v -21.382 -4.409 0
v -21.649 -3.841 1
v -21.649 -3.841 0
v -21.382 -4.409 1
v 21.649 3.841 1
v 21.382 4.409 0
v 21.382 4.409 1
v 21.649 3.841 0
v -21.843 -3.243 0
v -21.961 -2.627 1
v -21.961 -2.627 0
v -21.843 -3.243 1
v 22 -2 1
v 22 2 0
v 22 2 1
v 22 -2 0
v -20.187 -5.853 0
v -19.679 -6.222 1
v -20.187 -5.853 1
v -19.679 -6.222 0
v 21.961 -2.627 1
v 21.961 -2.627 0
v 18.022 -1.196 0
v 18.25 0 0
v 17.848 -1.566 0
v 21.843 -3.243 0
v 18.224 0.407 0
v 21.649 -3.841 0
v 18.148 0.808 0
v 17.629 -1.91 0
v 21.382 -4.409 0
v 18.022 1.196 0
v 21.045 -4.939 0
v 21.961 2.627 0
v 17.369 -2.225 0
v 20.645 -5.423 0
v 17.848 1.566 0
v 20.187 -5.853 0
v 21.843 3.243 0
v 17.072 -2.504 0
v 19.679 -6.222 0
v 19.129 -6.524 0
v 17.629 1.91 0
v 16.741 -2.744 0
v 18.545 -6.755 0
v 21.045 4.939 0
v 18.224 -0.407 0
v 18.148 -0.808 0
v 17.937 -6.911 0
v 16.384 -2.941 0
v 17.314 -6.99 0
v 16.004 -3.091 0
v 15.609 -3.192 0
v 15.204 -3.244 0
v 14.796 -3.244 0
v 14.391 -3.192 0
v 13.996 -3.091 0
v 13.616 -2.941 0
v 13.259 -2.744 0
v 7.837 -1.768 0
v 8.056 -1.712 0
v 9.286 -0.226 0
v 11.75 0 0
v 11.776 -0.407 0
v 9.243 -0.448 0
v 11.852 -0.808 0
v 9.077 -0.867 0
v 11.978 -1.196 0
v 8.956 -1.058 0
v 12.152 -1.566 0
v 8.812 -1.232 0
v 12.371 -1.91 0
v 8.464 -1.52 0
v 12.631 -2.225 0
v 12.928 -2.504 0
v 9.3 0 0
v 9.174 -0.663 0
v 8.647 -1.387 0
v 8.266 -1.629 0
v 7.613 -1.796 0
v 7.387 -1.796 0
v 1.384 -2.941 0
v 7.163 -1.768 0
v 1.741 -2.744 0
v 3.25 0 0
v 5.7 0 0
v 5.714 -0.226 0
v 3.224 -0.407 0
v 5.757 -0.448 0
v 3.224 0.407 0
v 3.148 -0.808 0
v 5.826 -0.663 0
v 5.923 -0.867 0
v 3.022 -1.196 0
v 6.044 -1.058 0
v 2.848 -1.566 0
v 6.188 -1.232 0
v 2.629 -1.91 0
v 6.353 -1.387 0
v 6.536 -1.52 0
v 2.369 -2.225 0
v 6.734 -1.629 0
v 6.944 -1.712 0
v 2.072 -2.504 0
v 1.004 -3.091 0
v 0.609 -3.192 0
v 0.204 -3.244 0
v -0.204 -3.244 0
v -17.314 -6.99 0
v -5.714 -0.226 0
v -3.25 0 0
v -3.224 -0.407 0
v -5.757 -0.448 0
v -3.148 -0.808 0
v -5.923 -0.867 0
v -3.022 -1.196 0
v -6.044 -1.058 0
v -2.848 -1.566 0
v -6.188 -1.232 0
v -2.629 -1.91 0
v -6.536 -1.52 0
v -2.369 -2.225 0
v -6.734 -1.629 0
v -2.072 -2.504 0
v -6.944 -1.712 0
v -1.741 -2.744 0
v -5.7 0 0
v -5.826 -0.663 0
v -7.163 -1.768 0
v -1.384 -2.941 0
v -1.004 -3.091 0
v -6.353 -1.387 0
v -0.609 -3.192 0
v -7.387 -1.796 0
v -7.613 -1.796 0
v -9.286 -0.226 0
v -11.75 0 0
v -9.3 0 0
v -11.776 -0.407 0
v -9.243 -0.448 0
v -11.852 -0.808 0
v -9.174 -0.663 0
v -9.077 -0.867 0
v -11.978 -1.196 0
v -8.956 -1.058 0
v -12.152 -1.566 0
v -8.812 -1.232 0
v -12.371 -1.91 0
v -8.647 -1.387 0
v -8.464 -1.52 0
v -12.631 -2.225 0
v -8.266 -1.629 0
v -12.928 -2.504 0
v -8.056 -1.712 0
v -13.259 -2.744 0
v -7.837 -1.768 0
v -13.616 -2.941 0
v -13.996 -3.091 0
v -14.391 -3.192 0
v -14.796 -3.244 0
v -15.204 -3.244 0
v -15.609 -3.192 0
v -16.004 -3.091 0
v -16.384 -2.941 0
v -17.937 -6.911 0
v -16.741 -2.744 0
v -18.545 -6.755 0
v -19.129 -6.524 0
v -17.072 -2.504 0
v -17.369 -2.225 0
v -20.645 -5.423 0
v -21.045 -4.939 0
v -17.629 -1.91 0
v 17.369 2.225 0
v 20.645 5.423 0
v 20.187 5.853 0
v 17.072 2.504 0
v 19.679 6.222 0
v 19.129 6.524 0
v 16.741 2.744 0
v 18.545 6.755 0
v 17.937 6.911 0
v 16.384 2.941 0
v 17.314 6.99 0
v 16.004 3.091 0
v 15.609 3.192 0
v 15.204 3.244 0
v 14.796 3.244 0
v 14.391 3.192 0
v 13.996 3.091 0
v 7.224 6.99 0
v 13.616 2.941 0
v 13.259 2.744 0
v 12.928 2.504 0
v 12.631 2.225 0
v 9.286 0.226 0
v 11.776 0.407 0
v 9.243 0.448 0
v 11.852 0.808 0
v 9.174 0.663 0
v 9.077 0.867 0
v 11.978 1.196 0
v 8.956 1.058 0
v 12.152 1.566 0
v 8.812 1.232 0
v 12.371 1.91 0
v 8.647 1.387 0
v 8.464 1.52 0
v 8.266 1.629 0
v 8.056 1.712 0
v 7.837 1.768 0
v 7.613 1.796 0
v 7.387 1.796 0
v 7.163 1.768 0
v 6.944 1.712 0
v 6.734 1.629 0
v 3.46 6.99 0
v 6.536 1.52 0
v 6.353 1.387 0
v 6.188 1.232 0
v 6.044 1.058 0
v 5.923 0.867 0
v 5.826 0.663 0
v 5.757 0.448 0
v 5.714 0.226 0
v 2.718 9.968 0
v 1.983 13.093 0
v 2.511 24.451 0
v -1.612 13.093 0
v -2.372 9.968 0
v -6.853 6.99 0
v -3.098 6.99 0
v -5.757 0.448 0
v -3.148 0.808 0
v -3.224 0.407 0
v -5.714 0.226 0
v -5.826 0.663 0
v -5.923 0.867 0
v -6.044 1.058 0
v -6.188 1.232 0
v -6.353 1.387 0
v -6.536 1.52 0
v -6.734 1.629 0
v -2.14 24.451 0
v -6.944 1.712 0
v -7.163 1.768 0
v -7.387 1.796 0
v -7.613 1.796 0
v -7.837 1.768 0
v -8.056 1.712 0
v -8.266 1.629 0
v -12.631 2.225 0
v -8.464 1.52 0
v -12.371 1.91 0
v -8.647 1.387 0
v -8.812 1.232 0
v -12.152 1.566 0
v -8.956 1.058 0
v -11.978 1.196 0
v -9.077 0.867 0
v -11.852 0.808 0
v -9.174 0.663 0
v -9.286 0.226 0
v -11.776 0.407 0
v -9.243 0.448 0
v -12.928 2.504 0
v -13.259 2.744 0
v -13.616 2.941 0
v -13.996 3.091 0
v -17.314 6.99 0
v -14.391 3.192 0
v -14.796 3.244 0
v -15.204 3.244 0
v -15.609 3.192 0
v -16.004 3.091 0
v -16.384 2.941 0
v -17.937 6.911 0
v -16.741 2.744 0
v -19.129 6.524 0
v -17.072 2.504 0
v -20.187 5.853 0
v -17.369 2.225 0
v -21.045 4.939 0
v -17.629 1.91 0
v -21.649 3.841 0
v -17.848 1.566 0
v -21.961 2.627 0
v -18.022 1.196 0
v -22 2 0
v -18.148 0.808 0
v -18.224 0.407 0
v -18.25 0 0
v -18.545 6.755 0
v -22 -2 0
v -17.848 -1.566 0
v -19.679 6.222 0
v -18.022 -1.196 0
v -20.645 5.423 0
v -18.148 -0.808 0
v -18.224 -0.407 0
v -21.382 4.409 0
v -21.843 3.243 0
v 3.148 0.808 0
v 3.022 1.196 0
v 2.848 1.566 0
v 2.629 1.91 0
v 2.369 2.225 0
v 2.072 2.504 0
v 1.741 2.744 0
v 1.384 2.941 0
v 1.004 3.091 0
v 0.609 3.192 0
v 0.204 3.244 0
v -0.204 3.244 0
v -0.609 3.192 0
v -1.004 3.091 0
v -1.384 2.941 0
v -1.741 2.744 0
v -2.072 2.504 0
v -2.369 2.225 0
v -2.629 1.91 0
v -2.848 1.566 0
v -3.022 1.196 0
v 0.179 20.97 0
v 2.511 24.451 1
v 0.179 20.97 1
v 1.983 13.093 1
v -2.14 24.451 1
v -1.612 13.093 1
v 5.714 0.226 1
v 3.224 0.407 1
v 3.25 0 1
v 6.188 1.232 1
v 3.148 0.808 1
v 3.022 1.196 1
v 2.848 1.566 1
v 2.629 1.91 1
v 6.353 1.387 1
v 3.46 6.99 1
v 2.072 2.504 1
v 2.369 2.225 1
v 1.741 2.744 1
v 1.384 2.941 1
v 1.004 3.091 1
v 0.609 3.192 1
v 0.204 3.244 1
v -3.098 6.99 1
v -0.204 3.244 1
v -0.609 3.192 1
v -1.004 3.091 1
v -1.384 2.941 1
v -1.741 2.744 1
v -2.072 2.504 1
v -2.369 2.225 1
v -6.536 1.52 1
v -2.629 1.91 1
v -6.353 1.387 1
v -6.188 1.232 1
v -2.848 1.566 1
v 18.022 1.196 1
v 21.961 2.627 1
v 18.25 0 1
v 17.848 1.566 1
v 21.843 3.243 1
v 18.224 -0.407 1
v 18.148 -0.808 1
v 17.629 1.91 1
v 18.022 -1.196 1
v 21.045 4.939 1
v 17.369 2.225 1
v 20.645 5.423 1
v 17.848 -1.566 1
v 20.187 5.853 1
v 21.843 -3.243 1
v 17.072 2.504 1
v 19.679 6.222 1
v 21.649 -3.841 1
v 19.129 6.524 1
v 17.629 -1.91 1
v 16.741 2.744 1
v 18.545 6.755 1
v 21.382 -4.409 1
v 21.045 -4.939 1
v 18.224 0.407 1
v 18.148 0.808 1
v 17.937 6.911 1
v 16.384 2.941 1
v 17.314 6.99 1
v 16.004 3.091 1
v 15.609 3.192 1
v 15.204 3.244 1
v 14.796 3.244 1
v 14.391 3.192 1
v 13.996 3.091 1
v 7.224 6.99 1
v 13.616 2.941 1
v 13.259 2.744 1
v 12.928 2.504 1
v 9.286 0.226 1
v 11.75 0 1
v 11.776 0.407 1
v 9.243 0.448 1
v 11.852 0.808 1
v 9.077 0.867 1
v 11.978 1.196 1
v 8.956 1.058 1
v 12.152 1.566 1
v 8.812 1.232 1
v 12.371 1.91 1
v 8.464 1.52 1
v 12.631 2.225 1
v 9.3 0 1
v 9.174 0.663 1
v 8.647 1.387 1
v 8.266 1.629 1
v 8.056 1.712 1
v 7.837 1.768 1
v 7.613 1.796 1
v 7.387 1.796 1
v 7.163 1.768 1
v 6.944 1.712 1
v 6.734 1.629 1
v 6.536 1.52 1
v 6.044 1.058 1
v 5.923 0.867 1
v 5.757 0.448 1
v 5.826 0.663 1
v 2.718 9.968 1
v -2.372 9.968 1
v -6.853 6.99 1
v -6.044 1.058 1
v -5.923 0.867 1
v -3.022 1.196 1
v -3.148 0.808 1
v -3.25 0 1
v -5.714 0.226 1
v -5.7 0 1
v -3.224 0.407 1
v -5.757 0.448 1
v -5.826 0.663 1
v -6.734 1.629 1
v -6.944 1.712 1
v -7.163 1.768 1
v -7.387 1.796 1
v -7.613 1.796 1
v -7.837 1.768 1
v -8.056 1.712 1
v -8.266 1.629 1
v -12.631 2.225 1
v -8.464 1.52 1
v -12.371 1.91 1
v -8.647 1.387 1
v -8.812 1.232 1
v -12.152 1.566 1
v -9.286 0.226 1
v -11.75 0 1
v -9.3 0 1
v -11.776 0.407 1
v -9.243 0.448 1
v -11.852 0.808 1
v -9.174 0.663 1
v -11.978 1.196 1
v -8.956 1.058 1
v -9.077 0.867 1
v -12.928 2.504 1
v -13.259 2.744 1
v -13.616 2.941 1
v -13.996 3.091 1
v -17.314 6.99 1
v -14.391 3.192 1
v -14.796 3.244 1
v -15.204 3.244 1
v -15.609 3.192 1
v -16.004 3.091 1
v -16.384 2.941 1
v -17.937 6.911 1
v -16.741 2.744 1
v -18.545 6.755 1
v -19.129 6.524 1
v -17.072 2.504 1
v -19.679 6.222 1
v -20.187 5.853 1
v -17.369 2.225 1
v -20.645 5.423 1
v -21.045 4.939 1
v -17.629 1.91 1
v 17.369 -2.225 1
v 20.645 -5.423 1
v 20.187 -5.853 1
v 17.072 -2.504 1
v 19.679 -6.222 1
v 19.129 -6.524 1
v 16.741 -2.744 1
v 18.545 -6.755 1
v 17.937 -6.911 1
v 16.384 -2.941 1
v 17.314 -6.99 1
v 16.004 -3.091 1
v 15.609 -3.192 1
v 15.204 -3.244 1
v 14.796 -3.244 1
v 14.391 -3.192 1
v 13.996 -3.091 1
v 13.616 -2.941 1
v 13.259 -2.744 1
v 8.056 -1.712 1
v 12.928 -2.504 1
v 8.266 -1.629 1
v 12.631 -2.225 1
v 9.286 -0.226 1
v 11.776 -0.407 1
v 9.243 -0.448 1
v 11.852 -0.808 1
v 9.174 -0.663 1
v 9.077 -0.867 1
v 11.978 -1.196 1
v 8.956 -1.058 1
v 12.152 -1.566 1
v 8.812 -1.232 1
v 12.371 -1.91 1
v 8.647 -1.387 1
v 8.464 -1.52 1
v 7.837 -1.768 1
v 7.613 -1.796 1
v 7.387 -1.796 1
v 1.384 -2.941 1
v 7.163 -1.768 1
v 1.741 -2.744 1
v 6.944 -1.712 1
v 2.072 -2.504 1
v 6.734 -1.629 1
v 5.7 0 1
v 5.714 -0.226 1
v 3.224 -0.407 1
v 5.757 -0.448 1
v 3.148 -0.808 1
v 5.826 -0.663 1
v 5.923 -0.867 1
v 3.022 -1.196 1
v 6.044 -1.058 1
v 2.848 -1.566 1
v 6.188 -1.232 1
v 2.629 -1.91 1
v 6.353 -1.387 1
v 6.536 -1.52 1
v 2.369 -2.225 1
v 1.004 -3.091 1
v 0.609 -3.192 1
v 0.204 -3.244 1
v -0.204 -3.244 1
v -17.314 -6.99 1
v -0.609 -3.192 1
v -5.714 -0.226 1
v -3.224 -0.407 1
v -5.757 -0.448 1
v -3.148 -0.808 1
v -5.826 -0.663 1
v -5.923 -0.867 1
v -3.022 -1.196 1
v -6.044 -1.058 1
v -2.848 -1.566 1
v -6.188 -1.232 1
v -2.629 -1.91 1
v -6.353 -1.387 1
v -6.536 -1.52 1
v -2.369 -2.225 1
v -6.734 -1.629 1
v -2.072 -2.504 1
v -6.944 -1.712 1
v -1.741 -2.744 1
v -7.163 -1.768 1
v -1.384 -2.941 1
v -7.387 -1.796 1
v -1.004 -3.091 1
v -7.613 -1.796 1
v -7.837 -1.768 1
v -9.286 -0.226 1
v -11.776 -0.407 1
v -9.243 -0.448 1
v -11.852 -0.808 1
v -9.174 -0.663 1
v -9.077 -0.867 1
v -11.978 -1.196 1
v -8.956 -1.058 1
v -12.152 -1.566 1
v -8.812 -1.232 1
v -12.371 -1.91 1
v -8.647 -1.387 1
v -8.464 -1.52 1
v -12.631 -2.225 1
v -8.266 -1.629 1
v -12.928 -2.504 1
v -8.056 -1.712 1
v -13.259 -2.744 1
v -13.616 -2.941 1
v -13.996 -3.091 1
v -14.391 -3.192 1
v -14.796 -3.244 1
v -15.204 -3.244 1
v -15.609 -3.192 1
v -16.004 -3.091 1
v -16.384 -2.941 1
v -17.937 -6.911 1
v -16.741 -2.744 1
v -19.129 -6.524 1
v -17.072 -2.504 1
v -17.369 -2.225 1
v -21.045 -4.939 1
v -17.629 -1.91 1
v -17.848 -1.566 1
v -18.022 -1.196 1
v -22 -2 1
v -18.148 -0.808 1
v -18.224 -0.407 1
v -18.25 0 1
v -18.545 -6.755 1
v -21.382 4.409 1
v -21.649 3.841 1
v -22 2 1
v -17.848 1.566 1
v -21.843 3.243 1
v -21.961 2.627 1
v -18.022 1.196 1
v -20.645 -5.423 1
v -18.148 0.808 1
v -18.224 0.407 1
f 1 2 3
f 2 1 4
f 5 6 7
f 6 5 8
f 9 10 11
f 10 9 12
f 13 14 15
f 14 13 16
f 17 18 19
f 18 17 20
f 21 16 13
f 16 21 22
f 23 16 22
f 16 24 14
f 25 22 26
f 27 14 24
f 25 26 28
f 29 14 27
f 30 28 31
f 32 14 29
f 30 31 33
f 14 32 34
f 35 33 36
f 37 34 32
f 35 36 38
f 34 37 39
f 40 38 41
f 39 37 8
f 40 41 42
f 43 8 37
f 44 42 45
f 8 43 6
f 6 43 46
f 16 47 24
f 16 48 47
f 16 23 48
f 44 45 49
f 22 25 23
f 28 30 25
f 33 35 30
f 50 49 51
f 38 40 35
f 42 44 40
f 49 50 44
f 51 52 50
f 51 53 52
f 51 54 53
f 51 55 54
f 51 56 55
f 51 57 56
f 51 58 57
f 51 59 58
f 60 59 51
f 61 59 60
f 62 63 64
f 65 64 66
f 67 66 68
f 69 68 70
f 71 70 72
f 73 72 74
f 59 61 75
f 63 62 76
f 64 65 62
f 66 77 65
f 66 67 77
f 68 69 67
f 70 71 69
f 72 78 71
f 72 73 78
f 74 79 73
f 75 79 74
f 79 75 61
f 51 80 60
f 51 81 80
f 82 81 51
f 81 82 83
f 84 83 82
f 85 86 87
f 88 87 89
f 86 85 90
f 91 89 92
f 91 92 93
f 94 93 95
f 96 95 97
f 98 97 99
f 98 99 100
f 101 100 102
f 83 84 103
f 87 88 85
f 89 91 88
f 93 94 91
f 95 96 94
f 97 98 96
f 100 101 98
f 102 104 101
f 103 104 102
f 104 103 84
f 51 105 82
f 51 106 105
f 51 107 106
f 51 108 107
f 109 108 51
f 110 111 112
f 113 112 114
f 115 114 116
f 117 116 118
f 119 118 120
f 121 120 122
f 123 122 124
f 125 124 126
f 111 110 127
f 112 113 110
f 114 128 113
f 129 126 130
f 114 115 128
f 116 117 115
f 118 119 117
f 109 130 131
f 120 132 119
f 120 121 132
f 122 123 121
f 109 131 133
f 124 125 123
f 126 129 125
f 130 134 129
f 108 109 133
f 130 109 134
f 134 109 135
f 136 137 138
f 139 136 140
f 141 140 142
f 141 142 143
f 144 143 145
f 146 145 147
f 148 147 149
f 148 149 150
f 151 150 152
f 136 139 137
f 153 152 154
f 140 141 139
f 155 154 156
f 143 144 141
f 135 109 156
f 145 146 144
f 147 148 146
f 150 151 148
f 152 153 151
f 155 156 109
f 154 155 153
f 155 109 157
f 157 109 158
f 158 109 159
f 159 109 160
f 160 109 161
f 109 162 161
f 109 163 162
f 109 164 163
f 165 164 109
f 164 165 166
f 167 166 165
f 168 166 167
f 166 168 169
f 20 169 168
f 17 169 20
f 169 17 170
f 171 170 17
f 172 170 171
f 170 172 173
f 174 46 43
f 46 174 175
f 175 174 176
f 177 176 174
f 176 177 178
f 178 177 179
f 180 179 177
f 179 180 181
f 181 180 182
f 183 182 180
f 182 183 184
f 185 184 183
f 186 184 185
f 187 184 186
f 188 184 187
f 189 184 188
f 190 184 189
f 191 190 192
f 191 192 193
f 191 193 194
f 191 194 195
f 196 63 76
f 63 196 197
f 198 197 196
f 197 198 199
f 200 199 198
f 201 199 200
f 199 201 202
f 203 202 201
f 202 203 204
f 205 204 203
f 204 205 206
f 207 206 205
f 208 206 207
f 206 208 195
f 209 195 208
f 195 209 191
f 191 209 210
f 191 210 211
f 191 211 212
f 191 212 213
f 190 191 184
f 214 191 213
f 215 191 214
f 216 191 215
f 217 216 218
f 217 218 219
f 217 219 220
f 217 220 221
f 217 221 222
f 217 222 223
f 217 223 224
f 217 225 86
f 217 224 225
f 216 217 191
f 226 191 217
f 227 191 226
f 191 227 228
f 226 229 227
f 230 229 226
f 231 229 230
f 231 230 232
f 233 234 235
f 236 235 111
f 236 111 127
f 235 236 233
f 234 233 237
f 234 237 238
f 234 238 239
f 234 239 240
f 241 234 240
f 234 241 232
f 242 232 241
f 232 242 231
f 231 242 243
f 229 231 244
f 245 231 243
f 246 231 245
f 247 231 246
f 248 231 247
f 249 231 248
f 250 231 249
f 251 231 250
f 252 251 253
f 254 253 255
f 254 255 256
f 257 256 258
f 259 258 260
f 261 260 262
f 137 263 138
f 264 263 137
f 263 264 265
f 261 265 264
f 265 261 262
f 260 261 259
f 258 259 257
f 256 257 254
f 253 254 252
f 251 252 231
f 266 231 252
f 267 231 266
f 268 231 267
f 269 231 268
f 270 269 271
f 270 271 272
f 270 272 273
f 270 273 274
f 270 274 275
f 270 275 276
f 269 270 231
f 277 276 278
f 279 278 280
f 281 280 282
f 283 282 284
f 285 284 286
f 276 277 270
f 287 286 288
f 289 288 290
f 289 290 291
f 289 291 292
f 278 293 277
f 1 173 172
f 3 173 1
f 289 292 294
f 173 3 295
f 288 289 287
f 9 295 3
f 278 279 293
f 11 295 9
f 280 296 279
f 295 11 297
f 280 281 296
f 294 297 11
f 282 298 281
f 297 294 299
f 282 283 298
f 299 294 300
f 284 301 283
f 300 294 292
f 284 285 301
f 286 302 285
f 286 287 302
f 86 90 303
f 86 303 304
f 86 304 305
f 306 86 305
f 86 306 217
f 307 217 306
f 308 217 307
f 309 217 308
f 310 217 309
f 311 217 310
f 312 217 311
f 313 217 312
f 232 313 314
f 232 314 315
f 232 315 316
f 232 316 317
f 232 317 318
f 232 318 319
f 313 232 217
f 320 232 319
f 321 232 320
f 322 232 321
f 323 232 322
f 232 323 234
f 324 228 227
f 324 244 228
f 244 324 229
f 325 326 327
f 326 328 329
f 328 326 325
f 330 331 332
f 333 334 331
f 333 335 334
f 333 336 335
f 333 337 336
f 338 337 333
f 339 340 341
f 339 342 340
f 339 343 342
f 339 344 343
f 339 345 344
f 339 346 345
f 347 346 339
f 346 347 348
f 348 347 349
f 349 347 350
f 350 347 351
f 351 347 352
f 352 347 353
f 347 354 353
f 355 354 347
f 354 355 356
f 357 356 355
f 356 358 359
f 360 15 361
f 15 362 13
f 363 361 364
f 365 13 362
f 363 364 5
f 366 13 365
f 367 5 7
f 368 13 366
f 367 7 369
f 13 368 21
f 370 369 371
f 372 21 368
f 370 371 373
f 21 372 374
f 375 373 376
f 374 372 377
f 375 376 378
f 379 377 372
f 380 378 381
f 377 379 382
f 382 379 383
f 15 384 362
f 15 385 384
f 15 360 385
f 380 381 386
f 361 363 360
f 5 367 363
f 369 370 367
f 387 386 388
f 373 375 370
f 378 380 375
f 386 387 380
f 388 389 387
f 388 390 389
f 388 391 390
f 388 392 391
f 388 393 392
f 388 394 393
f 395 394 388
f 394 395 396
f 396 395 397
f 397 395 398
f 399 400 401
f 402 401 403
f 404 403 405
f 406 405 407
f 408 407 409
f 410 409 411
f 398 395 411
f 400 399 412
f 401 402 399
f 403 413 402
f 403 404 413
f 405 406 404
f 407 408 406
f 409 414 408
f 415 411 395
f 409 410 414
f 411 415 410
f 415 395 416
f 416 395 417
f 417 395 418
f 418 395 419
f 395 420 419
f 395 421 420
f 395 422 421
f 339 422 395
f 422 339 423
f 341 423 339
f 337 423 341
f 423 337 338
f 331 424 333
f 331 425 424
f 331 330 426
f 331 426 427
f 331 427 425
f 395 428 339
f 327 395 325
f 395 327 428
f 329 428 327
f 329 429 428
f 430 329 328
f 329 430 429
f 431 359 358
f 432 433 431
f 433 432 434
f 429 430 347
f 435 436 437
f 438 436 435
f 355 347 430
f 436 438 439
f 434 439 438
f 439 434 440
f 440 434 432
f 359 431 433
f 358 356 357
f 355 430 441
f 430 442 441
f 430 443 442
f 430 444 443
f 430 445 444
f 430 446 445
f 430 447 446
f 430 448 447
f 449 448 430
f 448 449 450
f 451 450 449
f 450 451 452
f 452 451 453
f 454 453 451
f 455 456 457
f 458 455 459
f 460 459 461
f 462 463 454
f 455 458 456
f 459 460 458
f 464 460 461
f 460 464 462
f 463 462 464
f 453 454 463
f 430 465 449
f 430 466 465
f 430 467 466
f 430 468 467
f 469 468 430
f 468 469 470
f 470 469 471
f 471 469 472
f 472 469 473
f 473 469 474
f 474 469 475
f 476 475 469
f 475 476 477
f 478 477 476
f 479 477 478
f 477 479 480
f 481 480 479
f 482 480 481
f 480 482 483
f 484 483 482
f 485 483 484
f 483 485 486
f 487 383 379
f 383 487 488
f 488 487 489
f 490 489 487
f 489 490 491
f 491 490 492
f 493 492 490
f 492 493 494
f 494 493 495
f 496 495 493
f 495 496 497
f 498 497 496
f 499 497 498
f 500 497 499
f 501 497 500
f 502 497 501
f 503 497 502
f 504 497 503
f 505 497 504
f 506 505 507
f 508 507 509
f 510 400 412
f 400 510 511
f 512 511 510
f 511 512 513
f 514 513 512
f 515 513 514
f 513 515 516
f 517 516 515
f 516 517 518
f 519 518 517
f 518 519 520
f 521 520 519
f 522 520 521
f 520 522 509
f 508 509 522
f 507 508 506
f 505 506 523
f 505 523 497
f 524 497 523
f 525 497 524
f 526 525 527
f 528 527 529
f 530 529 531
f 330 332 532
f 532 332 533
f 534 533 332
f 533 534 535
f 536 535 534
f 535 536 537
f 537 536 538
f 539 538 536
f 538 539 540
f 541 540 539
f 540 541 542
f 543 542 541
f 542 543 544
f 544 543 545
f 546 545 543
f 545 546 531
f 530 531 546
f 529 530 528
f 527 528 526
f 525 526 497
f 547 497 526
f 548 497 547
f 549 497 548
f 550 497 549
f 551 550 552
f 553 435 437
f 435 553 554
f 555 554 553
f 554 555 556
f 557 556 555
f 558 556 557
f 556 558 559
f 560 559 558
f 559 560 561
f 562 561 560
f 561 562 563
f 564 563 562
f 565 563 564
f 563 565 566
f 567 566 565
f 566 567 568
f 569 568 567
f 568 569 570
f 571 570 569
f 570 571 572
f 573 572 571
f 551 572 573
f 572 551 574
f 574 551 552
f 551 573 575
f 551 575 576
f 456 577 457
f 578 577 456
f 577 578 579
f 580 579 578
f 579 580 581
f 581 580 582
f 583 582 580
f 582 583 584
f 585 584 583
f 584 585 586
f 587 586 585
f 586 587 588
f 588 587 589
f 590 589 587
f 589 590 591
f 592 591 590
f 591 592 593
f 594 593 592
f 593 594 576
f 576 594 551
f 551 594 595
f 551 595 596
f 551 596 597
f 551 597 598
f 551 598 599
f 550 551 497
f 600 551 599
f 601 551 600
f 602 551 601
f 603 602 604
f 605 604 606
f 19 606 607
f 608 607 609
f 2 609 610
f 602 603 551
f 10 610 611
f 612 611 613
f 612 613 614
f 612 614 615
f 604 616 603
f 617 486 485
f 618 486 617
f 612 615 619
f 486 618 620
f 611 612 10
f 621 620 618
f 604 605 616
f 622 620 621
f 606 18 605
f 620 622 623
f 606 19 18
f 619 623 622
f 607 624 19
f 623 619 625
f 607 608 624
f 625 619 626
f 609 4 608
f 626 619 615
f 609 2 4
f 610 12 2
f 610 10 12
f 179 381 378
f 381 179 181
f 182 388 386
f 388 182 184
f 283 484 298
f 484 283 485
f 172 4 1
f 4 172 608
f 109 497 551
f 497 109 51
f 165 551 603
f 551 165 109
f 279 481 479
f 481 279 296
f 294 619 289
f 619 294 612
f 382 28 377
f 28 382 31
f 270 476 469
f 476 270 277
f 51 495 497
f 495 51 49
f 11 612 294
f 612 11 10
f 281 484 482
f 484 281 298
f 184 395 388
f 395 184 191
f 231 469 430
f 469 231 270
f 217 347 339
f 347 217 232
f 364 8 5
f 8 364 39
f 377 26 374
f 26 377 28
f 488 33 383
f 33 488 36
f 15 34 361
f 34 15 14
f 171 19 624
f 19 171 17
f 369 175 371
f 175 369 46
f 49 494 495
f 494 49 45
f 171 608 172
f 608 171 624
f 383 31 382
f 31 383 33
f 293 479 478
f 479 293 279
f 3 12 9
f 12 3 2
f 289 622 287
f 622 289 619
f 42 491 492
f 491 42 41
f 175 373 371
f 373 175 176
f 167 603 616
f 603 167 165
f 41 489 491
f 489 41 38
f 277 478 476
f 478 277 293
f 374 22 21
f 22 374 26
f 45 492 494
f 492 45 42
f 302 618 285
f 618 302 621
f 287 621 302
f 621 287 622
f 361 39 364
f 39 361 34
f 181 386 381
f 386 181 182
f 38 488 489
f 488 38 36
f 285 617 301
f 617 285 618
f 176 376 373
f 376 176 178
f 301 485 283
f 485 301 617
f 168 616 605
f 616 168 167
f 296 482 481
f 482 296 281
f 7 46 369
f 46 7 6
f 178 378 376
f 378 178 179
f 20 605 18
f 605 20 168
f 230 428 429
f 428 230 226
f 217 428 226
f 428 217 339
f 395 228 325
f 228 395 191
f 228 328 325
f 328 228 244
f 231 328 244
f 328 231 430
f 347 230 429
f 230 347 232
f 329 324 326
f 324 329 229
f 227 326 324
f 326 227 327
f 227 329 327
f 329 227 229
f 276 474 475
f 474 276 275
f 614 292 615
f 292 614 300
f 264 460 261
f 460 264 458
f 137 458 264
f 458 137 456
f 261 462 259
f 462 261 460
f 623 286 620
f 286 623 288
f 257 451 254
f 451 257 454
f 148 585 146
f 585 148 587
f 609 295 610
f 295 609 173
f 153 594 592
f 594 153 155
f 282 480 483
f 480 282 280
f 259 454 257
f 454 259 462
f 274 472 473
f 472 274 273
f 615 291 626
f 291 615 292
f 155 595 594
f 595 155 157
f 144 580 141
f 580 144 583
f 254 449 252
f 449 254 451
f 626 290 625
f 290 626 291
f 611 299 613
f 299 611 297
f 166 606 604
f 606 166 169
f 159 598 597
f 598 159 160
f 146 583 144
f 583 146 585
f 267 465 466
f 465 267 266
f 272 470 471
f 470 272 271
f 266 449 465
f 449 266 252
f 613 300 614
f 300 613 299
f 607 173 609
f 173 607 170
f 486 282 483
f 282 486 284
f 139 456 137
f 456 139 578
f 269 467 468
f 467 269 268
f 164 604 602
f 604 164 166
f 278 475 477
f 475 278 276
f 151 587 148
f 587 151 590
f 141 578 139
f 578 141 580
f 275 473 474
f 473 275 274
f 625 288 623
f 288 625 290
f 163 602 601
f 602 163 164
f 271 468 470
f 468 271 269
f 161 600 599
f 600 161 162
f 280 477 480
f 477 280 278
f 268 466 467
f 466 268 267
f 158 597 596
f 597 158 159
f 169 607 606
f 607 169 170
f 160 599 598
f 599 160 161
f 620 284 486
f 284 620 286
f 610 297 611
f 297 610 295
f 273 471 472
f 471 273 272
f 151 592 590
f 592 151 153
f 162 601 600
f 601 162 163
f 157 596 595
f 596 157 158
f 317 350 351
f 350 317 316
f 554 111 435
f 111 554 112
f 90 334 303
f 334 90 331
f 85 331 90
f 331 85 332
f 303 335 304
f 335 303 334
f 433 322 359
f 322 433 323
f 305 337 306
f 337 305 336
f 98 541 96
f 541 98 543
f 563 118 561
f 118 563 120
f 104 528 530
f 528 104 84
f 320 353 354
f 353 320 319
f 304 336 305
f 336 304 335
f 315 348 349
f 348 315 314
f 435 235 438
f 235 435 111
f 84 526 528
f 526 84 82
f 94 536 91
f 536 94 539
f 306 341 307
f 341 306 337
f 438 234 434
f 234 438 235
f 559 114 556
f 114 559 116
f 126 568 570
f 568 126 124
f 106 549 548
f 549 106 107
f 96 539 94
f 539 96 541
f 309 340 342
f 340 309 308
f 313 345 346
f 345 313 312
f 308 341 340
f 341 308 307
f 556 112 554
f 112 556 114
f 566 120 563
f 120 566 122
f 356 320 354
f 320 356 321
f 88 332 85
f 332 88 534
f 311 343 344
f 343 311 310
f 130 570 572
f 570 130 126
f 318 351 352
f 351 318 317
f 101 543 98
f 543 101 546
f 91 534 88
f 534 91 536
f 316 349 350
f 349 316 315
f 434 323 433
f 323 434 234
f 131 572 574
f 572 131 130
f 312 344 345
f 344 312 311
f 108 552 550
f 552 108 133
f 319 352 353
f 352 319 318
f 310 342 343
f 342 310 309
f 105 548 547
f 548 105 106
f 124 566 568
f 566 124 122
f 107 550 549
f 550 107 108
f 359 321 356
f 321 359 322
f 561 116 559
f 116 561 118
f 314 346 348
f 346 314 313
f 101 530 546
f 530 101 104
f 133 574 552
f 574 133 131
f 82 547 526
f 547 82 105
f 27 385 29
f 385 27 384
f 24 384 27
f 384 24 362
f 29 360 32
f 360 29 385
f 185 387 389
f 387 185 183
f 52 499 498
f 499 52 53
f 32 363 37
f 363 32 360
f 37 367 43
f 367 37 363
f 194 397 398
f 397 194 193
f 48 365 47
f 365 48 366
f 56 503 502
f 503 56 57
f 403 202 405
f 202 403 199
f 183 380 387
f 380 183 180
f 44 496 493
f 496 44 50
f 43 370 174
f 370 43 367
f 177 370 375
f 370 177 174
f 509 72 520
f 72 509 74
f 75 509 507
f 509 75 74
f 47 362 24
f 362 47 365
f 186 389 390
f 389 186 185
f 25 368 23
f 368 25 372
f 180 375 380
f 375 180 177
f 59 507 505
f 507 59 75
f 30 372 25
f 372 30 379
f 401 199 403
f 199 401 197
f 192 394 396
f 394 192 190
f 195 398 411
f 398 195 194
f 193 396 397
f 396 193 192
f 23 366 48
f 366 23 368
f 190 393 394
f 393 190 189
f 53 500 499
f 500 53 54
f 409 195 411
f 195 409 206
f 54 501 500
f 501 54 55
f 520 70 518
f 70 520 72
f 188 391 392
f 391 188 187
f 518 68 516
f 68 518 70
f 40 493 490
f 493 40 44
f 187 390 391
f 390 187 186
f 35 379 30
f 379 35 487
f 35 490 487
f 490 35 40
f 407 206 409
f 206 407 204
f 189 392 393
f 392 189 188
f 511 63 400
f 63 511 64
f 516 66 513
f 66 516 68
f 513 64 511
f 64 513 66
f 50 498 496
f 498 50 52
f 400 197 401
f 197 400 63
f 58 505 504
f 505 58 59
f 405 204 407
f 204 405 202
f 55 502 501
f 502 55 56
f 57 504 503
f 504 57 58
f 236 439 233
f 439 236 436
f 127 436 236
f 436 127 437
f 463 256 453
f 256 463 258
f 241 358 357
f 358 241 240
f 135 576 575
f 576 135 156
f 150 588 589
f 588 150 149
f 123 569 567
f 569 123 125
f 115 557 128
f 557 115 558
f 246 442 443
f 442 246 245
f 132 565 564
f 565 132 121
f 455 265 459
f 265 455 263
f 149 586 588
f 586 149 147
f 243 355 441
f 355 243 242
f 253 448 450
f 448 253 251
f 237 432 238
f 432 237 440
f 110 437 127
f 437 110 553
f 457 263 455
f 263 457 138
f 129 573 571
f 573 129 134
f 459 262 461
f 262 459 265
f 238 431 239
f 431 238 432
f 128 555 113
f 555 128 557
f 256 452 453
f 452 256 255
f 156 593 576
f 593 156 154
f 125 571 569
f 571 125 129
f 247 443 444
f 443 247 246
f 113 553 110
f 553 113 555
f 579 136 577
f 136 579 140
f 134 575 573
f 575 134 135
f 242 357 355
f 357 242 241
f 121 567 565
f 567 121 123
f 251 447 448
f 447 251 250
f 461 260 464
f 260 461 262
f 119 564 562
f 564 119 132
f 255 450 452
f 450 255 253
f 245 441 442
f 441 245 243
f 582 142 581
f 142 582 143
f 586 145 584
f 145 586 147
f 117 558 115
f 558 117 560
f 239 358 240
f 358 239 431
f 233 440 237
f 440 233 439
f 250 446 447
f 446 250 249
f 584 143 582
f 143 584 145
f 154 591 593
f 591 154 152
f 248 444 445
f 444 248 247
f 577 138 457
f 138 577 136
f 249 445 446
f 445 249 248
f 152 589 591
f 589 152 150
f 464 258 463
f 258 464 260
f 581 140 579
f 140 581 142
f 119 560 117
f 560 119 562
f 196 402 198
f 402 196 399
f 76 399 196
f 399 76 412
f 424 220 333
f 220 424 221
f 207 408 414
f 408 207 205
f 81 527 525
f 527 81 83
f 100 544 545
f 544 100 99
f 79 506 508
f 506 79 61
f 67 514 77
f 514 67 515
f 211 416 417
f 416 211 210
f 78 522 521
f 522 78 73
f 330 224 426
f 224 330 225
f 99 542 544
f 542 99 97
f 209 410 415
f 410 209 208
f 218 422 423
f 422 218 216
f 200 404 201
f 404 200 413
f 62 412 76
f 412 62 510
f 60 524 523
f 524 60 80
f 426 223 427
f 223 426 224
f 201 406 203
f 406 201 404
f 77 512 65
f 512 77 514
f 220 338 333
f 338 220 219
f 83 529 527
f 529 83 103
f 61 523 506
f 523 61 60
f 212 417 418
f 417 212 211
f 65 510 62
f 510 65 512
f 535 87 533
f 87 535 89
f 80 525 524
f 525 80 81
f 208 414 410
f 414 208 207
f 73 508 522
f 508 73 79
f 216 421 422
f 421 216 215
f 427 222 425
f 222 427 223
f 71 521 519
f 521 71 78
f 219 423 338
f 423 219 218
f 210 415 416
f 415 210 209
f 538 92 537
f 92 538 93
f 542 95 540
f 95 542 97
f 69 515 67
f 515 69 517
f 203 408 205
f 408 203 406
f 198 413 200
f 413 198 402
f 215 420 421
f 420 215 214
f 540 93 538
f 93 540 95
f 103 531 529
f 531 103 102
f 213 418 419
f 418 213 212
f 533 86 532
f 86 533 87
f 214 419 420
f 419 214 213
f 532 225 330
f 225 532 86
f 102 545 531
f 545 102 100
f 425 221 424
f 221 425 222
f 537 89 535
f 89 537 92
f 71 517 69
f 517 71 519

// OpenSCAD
$fn = 50;


difference() {
	union() {
		hull() {
			translate(v = [-17.0000000000, 2.0000000000, 0]) {
				cylinder(h = 1, r = 5);
			}
			translate(v = [17.0000000000, 2.0000000000, 0]) {
				cylinder(h = 1, r = 5);
			}
			translate(v = [-17.0000000000, -2.0000000000, 0]) {
				cylinder(h = 1, r = 5);
			}
			translate(v = [17.0000000000, -2.0000000000, 0]) {
				cylinder(h = 1, r = 5);
			}
		}
		translate(v = [0, 24, 0]) {
			linear_extrude(height = 1) {
				text(font = "DejaVu Sans Mono:style=Bold", halign = "center", size = 19.0000000000, text = "A", valign = "top");
			}
		}
	}
	union() {
		translate(v = [-15.0000000000, 0.0000000000, 0]) {
			translate(v = [0, 0, -100]) {
				cylinder(h = 200, r = 3.2500000000);
			}
		}
		translate(v = [0, 0, -100]) {
			cylinder(h = 200, r = 3.2500000000);
		}
		translate(v = [15.0000000000, 0.0000000000, 0]) {
			translate(v = [0, 0, -100]) {
				cylinder(h = 200, r = 3.2500000000);
			}
		}
		translate(v = [-15.0000000000, 0.0000000000, 0]) {
			translate(v = [0, 0, -100]) {
				cylinder(h = 200, r = 1.8000000000);
			}
		}
		translate(v = [-7.5000000000, 0.0000000000, 0]) {
			translate(v = [0, 0, -100]) {
				cylinder(h = 200, r = 1.8000000000);
			}
		}
		translate(v = [0, 0, -100]) {
			cylinder(h = 200, r = 1.8000000000);
		}
		translate(v = [7.5000000000, 0.0000000000, 0]) {
			translate(v = [0, 0, -100]) {
				cylinder(h = 200, r = 1.8000000000);
			}
		}
		translate(v = [15.0000000000, 0.0000000000, 0]) {
			translate(v = [0, 0, -100]) {
				cylinder(h = 200, r = 1.8000000000);
			}
		}
	}
}
